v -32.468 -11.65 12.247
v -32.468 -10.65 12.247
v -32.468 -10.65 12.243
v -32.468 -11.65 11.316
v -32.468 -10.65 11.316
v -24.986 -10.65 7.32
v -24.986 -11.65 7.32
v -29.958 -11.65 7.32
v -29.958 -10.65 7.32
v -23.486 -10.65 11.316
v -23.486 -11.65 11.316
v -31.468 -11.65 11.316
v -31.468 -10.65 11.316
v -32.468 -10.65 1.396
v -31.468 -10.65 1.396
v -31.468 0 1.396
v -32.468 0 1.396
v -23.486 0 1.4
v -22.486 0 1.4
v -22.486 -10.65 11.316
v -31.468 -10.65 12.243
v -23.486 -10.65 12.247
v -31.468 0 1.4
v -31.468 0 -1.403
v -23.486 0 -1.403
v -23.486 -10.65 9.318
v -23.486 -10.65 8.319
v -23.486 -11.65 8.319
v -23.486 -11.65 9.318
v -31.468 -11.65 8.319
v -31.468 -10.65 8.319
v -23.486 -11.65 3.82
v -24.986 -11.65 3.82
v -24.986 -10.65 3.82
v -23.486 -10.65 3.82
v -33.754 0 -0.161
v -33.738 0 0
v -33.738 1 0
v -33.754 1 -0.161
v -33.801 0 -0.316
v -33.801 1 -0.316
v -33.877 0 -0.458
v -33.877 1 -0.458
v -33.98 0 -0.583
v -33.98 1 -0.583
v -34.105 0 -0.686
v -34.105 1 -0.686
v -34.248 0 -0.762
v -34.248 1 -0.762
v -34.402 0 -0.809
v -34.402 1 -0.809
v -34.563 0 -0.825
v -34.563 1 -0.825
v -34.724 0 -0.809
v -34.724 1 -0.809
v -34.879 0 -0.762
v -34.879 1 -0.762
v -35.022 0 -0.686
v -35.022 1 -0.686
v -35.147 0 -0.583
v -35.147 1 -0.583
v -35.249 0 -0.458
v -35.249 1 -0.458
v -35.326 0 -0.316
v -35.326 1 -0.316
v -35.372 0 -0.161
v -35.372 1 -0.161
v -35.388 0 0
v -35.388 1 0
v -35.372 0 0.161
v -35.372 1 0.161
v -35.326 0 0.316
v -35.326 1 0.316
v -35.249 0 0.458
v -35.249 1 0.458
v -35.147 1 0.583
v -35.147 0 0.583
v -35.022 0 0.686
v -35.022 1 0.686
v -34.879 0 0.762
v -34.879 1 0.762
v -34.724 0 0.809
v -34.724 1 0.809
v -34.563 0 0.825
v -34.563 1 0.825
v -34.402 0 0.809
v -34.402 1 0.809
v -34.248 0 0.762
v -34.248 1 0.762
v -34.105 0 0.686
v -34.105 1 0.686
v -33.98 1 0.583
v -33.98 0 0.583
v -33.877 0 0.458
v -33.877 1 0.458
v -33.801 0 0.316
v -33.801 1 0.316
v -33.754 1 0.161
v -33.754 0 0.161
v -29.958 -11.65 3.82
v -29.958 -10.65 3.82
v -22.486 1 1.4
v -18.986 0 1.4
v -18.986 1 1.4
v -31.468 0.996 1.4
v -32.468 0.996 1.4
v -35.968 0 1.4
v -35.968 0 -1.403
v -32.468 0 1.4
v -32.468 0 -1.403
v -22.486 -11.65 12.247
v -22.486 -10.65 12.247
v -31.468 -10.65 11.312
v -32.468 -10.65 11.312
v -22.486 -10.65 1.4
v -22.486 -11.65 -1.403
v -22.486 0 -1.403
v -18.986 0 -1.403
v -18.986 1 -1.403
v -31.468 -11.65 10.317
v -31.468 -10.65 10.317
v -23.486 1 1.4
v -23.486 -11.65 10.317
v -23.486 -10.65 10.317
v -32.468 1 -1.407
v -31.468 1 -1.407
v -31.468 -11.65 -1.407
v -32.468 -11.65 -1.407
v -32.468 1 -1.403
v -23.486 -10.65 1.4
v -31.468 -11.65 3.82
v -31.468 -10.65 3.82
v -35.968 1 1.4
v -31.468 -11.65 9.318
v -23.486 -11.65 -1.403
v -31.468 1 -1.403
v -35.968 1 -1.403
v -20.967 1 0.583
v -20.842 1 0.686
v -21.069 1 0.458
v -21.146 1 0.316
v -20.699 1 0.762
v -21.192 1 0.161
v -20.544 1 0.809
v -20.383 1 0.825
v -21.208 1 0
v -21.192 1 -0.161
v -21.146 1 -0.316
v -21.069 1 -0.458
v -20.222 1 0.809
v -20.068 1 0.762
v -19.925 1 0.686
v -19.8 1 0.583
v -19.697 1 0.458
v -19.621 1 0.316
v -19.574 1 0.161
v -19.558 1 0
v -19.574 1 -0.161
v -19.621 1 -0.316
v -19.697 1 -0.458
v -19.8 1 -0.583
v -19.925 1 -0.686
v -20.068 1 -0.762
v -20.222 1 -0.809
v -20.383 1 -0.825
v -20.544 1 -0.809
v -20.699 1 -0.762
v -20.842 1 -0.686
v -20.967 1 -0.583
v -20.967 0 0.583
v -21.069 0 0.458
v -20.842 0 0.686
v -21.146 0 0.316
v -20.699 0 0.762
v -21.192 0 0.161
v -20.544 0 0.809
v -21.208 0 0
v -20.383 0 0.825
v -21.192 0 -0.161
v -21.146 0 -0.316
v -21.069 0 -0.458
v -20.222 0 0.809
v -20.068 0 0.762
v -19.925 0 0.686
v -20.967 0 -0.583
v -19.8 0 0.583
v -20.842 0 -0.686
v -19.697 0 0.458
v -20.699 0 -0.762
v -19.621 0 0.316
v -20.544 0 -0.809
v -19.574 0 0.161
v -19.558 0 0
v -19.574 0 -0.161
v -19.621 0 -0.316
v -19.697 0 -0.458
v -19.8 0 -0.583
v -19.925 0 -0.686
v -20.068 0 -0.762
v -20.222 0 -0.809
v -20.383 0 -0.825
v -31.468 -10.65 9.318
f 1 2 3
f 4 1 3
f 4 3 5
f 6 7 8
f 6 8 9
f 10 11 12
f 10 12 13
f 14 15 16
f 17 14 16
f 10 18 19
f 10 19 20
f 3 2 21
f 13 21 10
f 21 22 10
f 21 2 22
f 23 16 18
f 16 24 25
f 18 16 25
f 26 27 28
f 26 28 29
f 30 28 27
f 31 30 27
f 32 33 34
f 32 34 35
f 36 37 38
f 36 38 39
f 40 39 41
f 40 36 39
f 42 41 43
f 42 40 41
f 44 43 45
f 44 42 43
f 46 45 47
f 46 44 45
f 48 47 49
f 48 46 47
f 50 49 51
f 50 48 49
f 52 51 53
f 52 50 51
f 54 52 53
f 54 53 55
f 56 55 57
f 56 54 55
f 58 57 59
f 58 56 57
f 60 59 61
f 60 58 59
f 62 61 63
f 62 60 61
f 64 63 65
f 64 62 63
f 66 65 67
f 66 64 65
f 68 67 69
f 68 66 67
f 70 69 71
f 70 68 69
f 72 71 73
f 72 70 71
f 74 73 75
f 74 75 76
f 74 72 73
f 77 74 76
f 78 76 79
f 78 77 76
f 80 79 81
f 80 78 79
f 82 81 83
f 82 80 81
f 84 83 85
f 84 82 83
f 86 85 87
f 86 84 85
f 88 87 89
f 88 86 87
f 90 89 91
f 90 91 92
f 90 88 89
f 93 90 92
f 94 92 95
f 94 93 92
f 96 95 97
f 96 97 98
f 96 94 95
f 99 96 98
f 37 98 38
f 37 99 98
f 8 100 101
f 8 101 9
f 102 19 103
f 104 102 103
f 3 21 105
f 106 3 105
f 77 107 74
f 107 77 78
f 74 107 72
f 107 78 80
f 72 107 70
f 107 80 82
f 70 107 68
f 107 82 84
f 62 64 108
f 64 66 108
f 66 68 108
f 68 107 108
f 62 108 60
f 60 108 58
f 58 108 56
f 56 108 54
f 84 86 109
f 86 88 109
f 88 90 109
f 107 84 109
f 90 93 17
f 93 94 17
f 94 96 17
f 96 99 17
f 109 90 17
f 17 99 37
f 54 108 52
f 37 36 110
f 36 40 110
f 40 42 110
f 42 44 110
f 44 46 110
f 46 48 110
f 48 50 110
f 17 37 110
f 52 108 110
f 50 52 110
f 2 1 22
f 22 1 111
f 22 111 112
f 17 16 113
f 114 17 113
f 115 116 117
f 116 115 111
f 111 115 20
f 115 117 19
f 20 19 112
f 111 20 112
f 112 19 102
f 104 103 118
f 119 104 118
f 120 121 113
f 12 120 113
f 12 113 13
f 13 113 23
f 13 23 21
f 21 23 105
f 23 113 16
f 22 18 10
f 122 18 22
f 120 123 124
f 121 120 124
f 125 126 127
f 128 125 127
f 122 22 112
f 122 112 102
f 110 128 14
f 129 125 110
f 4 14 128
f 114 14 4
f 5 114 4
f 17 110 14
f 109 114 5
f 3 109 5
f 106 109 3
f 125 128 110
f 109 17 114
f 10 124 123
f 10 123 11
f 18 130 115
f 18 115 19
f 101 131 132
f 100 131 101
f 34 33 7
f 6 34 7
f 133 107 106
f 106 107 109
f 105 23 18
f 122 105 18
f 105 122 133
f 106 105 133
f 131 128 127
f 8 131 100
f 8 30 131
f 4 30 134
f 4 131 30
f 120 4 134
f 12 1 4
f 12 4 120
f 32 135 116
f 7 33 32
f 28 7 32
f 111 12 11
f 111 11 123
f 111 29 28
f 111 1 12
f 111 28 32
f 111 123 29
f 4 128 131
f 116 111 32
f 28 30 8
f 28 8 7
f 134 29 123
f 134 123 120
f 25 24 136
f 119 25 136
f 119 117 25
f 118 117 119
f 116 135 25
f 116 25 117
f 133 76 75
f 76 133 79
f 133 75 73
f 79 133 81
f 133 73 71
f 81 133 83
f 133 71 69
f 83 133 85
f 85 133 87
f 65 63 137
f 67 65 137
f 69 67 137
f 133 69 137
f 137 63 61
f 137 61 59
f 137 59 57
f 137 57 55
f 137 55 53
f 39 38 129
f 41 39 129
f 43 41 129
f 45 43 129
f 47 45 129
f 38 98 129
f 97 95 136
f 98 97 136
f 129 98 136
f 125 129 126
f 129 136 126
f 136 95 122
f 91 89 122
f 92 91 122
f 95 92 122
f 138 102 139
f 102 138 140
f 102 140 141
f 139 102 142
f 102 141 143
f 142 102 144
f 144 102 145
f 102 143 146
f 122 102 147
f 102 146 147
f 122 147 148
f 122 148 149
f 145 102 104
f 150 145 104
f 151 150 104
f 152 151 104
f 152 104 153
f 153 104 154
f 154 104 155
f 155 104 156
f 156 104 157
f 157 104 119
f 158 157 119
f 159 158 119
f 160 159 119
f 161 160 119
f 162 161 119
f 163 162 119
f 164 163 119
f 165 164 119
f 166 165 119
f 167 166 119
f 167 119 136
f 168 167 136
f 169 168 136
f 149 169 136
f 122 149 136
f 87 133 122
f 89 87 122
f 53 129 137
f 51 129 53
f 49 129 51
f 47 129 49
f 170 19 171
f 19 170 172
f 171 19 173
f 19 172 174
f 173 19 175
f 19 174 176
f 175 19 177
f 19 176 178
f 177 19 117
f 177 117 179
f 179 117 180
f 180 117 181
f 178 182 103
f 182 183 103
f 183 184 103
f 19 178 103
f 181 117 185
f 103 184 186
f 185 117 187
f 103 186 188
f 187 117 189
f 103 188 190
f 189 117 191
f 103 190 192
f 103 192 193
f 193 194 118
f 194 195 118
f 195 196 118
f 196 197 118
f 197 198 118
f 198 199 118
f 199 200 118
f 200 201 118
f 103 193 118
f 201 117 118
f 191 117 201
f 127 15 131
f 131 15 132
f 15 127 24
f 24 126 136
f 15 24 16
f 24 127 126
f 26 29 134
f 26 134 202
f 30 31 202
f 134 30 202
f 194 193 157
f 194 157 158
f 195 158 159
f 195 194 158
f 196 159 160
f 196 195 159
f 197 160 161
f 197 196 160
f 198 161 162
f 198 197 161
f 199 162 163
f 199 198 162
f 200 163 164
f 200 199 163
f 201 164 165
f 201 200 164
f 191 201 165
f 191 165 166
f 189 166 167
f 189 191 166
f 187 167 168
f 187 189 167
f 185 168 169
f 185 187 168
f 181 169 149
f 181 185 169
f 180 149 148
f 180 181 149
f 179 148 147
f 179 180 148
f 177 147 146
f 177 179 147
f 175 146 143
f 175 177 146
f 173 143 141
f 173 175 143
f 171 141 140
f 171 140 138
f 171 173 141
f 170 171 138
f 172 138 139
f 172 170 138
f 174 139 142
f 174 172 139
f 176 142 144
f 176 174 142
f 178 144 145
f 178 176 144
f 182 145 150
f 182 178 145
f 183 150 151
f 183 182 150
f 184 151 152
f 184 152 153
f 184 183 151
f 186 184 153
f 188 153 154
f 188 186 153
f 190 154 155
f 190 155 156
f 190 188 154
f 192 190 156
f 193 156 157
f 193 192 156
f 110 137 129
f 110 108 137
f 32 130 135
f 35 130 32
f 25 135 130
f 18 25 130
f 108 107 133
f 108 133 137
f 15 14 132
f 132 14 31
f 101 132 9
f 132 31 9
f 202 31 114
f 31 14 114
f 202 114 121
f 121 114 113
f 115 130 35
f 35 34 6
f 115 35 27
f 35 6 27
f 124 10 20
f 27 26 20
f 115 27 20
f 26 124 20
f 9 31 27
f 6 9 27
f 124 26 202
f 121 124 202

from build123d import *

# Parameters (mm, degrees)
SKETCH1_W           = 16.981866596
SKETCH1_H           = 2.802651254
SKETCH1_R           = 0.825
BOSS_EXTRUDE1_DEPTH = 1
BOSS_EXTRUDE4_DEPTH = 1
BOSS_EXTRUDE5_DEPTH = 1
SKETCH15_W          = 0.931061544
SKETCH15_H          = 1
SKETCH15_W_2        = 0.998936147
BOSS_EXTRUDE6_DEPTH = 9.981867
SKETCH16_W          = 1.5
SKETCH16_H          = 3.5
SKETCH16_W_2        = 1.510044564
BOSS_EXTRUDE7_DEPTH = 1


with BuildPart() as part:
    # Sketch1 → Boss-Extrude1 (new body)
    with BuildSketch(Plane(origin=(0, 0, 0), x_dir=(1, 0, 0), z_dir=(0, 1, 0))):
        with Locations((-27.477281267, 0.001515376)):
            Rectangle(SKETCH1_W, SKETCH1_H)
        with Locations((-34.563340606, 0)):
            Circle(SKETCH1_R, mode=Mode.SUBTRACT)
        with Locations((-20.383340606, 0)):
            Circle(SKETCH1_R, mode=Mode.SUBTRACT)
    extrude(amount=BOSS_EXTRUDE1_DEPTH)

    # Sketch9 → Boss-Extrude4 (add)
    with BuildSketch(Plane(origin=(-23.486347969, 0, 0), x_dir=(0, 0, -1), z_dir=(1, 0, 0))):
        Polygon((1.402841003, 1), (1.402841003, -11.65), (-12.246677238, -11.65), (-12.246677238, -10.65), (-1.399810251, 1), align=None)
        Polygon((-1.399810251, 0), (-11.315615694, -10.65), (-1.399810251, -10.65), align=None, mode=Mode.SUBTRACT)
    extrude(amount=BOSS_EXTRUDE4_DEPTH)

    # Sketch14 → Boss-Extrude5 (add)
    with BuildSketch(Plane.ZY.offset(31.468214565)):
        Polygon((-1.406908915, 1), (-1.406908915, -11.65), (12.242609326, -11.65), (12.242609326, -10.65), (1.395742339, 1), align=None)
        Polygon((11.311547782, -10.65), (1.395742339, -10.65), (1.395742339, 0), align=None, mode=Mode.SUBTRACT)
    extrude(amount=BOSS_EXTRUDE5_DEPTH)

    # Sketch15 → Boss-Extrude6 (add)
    with BuildSketch(Plane(origin=(-22.486347969, 0, 0), x_dir=(0, 0, -1), z_dir=(1, 0, 0))):
        with Locations((-11.781146466, -11.15)):
            Rectangle(SKETCH15_W, SKETCH15_H)
        with Locations((-9.817677681, -11.15)):
            Rectangle(SKETCH15_W_2, SKETCH15_H)
        with Locations((-7.819805388, -11.15)):
            Rectangle(SKETCH15_W_2, SKETCH15_H)
    extrude(amount=-BOSS_EXTRUDE6_DEPTH)

    # Sketch16 → Boss-Extrude7 (add)
    with BuildSketch(Plane.XZ.offset(11.65)):
        with Locations((-24.236347969, 5.570337314)):
            Rectangle(SKETCH16_W, SKETCH16_H)
        with Locations((-30.713192283, 5.570337314)):
            Rectangle(SKETCH16_W_2, SKETCH16_H)
    extrude(amount=-BOSS_EXTRUDE7_DEPTH)


solid = part.part
